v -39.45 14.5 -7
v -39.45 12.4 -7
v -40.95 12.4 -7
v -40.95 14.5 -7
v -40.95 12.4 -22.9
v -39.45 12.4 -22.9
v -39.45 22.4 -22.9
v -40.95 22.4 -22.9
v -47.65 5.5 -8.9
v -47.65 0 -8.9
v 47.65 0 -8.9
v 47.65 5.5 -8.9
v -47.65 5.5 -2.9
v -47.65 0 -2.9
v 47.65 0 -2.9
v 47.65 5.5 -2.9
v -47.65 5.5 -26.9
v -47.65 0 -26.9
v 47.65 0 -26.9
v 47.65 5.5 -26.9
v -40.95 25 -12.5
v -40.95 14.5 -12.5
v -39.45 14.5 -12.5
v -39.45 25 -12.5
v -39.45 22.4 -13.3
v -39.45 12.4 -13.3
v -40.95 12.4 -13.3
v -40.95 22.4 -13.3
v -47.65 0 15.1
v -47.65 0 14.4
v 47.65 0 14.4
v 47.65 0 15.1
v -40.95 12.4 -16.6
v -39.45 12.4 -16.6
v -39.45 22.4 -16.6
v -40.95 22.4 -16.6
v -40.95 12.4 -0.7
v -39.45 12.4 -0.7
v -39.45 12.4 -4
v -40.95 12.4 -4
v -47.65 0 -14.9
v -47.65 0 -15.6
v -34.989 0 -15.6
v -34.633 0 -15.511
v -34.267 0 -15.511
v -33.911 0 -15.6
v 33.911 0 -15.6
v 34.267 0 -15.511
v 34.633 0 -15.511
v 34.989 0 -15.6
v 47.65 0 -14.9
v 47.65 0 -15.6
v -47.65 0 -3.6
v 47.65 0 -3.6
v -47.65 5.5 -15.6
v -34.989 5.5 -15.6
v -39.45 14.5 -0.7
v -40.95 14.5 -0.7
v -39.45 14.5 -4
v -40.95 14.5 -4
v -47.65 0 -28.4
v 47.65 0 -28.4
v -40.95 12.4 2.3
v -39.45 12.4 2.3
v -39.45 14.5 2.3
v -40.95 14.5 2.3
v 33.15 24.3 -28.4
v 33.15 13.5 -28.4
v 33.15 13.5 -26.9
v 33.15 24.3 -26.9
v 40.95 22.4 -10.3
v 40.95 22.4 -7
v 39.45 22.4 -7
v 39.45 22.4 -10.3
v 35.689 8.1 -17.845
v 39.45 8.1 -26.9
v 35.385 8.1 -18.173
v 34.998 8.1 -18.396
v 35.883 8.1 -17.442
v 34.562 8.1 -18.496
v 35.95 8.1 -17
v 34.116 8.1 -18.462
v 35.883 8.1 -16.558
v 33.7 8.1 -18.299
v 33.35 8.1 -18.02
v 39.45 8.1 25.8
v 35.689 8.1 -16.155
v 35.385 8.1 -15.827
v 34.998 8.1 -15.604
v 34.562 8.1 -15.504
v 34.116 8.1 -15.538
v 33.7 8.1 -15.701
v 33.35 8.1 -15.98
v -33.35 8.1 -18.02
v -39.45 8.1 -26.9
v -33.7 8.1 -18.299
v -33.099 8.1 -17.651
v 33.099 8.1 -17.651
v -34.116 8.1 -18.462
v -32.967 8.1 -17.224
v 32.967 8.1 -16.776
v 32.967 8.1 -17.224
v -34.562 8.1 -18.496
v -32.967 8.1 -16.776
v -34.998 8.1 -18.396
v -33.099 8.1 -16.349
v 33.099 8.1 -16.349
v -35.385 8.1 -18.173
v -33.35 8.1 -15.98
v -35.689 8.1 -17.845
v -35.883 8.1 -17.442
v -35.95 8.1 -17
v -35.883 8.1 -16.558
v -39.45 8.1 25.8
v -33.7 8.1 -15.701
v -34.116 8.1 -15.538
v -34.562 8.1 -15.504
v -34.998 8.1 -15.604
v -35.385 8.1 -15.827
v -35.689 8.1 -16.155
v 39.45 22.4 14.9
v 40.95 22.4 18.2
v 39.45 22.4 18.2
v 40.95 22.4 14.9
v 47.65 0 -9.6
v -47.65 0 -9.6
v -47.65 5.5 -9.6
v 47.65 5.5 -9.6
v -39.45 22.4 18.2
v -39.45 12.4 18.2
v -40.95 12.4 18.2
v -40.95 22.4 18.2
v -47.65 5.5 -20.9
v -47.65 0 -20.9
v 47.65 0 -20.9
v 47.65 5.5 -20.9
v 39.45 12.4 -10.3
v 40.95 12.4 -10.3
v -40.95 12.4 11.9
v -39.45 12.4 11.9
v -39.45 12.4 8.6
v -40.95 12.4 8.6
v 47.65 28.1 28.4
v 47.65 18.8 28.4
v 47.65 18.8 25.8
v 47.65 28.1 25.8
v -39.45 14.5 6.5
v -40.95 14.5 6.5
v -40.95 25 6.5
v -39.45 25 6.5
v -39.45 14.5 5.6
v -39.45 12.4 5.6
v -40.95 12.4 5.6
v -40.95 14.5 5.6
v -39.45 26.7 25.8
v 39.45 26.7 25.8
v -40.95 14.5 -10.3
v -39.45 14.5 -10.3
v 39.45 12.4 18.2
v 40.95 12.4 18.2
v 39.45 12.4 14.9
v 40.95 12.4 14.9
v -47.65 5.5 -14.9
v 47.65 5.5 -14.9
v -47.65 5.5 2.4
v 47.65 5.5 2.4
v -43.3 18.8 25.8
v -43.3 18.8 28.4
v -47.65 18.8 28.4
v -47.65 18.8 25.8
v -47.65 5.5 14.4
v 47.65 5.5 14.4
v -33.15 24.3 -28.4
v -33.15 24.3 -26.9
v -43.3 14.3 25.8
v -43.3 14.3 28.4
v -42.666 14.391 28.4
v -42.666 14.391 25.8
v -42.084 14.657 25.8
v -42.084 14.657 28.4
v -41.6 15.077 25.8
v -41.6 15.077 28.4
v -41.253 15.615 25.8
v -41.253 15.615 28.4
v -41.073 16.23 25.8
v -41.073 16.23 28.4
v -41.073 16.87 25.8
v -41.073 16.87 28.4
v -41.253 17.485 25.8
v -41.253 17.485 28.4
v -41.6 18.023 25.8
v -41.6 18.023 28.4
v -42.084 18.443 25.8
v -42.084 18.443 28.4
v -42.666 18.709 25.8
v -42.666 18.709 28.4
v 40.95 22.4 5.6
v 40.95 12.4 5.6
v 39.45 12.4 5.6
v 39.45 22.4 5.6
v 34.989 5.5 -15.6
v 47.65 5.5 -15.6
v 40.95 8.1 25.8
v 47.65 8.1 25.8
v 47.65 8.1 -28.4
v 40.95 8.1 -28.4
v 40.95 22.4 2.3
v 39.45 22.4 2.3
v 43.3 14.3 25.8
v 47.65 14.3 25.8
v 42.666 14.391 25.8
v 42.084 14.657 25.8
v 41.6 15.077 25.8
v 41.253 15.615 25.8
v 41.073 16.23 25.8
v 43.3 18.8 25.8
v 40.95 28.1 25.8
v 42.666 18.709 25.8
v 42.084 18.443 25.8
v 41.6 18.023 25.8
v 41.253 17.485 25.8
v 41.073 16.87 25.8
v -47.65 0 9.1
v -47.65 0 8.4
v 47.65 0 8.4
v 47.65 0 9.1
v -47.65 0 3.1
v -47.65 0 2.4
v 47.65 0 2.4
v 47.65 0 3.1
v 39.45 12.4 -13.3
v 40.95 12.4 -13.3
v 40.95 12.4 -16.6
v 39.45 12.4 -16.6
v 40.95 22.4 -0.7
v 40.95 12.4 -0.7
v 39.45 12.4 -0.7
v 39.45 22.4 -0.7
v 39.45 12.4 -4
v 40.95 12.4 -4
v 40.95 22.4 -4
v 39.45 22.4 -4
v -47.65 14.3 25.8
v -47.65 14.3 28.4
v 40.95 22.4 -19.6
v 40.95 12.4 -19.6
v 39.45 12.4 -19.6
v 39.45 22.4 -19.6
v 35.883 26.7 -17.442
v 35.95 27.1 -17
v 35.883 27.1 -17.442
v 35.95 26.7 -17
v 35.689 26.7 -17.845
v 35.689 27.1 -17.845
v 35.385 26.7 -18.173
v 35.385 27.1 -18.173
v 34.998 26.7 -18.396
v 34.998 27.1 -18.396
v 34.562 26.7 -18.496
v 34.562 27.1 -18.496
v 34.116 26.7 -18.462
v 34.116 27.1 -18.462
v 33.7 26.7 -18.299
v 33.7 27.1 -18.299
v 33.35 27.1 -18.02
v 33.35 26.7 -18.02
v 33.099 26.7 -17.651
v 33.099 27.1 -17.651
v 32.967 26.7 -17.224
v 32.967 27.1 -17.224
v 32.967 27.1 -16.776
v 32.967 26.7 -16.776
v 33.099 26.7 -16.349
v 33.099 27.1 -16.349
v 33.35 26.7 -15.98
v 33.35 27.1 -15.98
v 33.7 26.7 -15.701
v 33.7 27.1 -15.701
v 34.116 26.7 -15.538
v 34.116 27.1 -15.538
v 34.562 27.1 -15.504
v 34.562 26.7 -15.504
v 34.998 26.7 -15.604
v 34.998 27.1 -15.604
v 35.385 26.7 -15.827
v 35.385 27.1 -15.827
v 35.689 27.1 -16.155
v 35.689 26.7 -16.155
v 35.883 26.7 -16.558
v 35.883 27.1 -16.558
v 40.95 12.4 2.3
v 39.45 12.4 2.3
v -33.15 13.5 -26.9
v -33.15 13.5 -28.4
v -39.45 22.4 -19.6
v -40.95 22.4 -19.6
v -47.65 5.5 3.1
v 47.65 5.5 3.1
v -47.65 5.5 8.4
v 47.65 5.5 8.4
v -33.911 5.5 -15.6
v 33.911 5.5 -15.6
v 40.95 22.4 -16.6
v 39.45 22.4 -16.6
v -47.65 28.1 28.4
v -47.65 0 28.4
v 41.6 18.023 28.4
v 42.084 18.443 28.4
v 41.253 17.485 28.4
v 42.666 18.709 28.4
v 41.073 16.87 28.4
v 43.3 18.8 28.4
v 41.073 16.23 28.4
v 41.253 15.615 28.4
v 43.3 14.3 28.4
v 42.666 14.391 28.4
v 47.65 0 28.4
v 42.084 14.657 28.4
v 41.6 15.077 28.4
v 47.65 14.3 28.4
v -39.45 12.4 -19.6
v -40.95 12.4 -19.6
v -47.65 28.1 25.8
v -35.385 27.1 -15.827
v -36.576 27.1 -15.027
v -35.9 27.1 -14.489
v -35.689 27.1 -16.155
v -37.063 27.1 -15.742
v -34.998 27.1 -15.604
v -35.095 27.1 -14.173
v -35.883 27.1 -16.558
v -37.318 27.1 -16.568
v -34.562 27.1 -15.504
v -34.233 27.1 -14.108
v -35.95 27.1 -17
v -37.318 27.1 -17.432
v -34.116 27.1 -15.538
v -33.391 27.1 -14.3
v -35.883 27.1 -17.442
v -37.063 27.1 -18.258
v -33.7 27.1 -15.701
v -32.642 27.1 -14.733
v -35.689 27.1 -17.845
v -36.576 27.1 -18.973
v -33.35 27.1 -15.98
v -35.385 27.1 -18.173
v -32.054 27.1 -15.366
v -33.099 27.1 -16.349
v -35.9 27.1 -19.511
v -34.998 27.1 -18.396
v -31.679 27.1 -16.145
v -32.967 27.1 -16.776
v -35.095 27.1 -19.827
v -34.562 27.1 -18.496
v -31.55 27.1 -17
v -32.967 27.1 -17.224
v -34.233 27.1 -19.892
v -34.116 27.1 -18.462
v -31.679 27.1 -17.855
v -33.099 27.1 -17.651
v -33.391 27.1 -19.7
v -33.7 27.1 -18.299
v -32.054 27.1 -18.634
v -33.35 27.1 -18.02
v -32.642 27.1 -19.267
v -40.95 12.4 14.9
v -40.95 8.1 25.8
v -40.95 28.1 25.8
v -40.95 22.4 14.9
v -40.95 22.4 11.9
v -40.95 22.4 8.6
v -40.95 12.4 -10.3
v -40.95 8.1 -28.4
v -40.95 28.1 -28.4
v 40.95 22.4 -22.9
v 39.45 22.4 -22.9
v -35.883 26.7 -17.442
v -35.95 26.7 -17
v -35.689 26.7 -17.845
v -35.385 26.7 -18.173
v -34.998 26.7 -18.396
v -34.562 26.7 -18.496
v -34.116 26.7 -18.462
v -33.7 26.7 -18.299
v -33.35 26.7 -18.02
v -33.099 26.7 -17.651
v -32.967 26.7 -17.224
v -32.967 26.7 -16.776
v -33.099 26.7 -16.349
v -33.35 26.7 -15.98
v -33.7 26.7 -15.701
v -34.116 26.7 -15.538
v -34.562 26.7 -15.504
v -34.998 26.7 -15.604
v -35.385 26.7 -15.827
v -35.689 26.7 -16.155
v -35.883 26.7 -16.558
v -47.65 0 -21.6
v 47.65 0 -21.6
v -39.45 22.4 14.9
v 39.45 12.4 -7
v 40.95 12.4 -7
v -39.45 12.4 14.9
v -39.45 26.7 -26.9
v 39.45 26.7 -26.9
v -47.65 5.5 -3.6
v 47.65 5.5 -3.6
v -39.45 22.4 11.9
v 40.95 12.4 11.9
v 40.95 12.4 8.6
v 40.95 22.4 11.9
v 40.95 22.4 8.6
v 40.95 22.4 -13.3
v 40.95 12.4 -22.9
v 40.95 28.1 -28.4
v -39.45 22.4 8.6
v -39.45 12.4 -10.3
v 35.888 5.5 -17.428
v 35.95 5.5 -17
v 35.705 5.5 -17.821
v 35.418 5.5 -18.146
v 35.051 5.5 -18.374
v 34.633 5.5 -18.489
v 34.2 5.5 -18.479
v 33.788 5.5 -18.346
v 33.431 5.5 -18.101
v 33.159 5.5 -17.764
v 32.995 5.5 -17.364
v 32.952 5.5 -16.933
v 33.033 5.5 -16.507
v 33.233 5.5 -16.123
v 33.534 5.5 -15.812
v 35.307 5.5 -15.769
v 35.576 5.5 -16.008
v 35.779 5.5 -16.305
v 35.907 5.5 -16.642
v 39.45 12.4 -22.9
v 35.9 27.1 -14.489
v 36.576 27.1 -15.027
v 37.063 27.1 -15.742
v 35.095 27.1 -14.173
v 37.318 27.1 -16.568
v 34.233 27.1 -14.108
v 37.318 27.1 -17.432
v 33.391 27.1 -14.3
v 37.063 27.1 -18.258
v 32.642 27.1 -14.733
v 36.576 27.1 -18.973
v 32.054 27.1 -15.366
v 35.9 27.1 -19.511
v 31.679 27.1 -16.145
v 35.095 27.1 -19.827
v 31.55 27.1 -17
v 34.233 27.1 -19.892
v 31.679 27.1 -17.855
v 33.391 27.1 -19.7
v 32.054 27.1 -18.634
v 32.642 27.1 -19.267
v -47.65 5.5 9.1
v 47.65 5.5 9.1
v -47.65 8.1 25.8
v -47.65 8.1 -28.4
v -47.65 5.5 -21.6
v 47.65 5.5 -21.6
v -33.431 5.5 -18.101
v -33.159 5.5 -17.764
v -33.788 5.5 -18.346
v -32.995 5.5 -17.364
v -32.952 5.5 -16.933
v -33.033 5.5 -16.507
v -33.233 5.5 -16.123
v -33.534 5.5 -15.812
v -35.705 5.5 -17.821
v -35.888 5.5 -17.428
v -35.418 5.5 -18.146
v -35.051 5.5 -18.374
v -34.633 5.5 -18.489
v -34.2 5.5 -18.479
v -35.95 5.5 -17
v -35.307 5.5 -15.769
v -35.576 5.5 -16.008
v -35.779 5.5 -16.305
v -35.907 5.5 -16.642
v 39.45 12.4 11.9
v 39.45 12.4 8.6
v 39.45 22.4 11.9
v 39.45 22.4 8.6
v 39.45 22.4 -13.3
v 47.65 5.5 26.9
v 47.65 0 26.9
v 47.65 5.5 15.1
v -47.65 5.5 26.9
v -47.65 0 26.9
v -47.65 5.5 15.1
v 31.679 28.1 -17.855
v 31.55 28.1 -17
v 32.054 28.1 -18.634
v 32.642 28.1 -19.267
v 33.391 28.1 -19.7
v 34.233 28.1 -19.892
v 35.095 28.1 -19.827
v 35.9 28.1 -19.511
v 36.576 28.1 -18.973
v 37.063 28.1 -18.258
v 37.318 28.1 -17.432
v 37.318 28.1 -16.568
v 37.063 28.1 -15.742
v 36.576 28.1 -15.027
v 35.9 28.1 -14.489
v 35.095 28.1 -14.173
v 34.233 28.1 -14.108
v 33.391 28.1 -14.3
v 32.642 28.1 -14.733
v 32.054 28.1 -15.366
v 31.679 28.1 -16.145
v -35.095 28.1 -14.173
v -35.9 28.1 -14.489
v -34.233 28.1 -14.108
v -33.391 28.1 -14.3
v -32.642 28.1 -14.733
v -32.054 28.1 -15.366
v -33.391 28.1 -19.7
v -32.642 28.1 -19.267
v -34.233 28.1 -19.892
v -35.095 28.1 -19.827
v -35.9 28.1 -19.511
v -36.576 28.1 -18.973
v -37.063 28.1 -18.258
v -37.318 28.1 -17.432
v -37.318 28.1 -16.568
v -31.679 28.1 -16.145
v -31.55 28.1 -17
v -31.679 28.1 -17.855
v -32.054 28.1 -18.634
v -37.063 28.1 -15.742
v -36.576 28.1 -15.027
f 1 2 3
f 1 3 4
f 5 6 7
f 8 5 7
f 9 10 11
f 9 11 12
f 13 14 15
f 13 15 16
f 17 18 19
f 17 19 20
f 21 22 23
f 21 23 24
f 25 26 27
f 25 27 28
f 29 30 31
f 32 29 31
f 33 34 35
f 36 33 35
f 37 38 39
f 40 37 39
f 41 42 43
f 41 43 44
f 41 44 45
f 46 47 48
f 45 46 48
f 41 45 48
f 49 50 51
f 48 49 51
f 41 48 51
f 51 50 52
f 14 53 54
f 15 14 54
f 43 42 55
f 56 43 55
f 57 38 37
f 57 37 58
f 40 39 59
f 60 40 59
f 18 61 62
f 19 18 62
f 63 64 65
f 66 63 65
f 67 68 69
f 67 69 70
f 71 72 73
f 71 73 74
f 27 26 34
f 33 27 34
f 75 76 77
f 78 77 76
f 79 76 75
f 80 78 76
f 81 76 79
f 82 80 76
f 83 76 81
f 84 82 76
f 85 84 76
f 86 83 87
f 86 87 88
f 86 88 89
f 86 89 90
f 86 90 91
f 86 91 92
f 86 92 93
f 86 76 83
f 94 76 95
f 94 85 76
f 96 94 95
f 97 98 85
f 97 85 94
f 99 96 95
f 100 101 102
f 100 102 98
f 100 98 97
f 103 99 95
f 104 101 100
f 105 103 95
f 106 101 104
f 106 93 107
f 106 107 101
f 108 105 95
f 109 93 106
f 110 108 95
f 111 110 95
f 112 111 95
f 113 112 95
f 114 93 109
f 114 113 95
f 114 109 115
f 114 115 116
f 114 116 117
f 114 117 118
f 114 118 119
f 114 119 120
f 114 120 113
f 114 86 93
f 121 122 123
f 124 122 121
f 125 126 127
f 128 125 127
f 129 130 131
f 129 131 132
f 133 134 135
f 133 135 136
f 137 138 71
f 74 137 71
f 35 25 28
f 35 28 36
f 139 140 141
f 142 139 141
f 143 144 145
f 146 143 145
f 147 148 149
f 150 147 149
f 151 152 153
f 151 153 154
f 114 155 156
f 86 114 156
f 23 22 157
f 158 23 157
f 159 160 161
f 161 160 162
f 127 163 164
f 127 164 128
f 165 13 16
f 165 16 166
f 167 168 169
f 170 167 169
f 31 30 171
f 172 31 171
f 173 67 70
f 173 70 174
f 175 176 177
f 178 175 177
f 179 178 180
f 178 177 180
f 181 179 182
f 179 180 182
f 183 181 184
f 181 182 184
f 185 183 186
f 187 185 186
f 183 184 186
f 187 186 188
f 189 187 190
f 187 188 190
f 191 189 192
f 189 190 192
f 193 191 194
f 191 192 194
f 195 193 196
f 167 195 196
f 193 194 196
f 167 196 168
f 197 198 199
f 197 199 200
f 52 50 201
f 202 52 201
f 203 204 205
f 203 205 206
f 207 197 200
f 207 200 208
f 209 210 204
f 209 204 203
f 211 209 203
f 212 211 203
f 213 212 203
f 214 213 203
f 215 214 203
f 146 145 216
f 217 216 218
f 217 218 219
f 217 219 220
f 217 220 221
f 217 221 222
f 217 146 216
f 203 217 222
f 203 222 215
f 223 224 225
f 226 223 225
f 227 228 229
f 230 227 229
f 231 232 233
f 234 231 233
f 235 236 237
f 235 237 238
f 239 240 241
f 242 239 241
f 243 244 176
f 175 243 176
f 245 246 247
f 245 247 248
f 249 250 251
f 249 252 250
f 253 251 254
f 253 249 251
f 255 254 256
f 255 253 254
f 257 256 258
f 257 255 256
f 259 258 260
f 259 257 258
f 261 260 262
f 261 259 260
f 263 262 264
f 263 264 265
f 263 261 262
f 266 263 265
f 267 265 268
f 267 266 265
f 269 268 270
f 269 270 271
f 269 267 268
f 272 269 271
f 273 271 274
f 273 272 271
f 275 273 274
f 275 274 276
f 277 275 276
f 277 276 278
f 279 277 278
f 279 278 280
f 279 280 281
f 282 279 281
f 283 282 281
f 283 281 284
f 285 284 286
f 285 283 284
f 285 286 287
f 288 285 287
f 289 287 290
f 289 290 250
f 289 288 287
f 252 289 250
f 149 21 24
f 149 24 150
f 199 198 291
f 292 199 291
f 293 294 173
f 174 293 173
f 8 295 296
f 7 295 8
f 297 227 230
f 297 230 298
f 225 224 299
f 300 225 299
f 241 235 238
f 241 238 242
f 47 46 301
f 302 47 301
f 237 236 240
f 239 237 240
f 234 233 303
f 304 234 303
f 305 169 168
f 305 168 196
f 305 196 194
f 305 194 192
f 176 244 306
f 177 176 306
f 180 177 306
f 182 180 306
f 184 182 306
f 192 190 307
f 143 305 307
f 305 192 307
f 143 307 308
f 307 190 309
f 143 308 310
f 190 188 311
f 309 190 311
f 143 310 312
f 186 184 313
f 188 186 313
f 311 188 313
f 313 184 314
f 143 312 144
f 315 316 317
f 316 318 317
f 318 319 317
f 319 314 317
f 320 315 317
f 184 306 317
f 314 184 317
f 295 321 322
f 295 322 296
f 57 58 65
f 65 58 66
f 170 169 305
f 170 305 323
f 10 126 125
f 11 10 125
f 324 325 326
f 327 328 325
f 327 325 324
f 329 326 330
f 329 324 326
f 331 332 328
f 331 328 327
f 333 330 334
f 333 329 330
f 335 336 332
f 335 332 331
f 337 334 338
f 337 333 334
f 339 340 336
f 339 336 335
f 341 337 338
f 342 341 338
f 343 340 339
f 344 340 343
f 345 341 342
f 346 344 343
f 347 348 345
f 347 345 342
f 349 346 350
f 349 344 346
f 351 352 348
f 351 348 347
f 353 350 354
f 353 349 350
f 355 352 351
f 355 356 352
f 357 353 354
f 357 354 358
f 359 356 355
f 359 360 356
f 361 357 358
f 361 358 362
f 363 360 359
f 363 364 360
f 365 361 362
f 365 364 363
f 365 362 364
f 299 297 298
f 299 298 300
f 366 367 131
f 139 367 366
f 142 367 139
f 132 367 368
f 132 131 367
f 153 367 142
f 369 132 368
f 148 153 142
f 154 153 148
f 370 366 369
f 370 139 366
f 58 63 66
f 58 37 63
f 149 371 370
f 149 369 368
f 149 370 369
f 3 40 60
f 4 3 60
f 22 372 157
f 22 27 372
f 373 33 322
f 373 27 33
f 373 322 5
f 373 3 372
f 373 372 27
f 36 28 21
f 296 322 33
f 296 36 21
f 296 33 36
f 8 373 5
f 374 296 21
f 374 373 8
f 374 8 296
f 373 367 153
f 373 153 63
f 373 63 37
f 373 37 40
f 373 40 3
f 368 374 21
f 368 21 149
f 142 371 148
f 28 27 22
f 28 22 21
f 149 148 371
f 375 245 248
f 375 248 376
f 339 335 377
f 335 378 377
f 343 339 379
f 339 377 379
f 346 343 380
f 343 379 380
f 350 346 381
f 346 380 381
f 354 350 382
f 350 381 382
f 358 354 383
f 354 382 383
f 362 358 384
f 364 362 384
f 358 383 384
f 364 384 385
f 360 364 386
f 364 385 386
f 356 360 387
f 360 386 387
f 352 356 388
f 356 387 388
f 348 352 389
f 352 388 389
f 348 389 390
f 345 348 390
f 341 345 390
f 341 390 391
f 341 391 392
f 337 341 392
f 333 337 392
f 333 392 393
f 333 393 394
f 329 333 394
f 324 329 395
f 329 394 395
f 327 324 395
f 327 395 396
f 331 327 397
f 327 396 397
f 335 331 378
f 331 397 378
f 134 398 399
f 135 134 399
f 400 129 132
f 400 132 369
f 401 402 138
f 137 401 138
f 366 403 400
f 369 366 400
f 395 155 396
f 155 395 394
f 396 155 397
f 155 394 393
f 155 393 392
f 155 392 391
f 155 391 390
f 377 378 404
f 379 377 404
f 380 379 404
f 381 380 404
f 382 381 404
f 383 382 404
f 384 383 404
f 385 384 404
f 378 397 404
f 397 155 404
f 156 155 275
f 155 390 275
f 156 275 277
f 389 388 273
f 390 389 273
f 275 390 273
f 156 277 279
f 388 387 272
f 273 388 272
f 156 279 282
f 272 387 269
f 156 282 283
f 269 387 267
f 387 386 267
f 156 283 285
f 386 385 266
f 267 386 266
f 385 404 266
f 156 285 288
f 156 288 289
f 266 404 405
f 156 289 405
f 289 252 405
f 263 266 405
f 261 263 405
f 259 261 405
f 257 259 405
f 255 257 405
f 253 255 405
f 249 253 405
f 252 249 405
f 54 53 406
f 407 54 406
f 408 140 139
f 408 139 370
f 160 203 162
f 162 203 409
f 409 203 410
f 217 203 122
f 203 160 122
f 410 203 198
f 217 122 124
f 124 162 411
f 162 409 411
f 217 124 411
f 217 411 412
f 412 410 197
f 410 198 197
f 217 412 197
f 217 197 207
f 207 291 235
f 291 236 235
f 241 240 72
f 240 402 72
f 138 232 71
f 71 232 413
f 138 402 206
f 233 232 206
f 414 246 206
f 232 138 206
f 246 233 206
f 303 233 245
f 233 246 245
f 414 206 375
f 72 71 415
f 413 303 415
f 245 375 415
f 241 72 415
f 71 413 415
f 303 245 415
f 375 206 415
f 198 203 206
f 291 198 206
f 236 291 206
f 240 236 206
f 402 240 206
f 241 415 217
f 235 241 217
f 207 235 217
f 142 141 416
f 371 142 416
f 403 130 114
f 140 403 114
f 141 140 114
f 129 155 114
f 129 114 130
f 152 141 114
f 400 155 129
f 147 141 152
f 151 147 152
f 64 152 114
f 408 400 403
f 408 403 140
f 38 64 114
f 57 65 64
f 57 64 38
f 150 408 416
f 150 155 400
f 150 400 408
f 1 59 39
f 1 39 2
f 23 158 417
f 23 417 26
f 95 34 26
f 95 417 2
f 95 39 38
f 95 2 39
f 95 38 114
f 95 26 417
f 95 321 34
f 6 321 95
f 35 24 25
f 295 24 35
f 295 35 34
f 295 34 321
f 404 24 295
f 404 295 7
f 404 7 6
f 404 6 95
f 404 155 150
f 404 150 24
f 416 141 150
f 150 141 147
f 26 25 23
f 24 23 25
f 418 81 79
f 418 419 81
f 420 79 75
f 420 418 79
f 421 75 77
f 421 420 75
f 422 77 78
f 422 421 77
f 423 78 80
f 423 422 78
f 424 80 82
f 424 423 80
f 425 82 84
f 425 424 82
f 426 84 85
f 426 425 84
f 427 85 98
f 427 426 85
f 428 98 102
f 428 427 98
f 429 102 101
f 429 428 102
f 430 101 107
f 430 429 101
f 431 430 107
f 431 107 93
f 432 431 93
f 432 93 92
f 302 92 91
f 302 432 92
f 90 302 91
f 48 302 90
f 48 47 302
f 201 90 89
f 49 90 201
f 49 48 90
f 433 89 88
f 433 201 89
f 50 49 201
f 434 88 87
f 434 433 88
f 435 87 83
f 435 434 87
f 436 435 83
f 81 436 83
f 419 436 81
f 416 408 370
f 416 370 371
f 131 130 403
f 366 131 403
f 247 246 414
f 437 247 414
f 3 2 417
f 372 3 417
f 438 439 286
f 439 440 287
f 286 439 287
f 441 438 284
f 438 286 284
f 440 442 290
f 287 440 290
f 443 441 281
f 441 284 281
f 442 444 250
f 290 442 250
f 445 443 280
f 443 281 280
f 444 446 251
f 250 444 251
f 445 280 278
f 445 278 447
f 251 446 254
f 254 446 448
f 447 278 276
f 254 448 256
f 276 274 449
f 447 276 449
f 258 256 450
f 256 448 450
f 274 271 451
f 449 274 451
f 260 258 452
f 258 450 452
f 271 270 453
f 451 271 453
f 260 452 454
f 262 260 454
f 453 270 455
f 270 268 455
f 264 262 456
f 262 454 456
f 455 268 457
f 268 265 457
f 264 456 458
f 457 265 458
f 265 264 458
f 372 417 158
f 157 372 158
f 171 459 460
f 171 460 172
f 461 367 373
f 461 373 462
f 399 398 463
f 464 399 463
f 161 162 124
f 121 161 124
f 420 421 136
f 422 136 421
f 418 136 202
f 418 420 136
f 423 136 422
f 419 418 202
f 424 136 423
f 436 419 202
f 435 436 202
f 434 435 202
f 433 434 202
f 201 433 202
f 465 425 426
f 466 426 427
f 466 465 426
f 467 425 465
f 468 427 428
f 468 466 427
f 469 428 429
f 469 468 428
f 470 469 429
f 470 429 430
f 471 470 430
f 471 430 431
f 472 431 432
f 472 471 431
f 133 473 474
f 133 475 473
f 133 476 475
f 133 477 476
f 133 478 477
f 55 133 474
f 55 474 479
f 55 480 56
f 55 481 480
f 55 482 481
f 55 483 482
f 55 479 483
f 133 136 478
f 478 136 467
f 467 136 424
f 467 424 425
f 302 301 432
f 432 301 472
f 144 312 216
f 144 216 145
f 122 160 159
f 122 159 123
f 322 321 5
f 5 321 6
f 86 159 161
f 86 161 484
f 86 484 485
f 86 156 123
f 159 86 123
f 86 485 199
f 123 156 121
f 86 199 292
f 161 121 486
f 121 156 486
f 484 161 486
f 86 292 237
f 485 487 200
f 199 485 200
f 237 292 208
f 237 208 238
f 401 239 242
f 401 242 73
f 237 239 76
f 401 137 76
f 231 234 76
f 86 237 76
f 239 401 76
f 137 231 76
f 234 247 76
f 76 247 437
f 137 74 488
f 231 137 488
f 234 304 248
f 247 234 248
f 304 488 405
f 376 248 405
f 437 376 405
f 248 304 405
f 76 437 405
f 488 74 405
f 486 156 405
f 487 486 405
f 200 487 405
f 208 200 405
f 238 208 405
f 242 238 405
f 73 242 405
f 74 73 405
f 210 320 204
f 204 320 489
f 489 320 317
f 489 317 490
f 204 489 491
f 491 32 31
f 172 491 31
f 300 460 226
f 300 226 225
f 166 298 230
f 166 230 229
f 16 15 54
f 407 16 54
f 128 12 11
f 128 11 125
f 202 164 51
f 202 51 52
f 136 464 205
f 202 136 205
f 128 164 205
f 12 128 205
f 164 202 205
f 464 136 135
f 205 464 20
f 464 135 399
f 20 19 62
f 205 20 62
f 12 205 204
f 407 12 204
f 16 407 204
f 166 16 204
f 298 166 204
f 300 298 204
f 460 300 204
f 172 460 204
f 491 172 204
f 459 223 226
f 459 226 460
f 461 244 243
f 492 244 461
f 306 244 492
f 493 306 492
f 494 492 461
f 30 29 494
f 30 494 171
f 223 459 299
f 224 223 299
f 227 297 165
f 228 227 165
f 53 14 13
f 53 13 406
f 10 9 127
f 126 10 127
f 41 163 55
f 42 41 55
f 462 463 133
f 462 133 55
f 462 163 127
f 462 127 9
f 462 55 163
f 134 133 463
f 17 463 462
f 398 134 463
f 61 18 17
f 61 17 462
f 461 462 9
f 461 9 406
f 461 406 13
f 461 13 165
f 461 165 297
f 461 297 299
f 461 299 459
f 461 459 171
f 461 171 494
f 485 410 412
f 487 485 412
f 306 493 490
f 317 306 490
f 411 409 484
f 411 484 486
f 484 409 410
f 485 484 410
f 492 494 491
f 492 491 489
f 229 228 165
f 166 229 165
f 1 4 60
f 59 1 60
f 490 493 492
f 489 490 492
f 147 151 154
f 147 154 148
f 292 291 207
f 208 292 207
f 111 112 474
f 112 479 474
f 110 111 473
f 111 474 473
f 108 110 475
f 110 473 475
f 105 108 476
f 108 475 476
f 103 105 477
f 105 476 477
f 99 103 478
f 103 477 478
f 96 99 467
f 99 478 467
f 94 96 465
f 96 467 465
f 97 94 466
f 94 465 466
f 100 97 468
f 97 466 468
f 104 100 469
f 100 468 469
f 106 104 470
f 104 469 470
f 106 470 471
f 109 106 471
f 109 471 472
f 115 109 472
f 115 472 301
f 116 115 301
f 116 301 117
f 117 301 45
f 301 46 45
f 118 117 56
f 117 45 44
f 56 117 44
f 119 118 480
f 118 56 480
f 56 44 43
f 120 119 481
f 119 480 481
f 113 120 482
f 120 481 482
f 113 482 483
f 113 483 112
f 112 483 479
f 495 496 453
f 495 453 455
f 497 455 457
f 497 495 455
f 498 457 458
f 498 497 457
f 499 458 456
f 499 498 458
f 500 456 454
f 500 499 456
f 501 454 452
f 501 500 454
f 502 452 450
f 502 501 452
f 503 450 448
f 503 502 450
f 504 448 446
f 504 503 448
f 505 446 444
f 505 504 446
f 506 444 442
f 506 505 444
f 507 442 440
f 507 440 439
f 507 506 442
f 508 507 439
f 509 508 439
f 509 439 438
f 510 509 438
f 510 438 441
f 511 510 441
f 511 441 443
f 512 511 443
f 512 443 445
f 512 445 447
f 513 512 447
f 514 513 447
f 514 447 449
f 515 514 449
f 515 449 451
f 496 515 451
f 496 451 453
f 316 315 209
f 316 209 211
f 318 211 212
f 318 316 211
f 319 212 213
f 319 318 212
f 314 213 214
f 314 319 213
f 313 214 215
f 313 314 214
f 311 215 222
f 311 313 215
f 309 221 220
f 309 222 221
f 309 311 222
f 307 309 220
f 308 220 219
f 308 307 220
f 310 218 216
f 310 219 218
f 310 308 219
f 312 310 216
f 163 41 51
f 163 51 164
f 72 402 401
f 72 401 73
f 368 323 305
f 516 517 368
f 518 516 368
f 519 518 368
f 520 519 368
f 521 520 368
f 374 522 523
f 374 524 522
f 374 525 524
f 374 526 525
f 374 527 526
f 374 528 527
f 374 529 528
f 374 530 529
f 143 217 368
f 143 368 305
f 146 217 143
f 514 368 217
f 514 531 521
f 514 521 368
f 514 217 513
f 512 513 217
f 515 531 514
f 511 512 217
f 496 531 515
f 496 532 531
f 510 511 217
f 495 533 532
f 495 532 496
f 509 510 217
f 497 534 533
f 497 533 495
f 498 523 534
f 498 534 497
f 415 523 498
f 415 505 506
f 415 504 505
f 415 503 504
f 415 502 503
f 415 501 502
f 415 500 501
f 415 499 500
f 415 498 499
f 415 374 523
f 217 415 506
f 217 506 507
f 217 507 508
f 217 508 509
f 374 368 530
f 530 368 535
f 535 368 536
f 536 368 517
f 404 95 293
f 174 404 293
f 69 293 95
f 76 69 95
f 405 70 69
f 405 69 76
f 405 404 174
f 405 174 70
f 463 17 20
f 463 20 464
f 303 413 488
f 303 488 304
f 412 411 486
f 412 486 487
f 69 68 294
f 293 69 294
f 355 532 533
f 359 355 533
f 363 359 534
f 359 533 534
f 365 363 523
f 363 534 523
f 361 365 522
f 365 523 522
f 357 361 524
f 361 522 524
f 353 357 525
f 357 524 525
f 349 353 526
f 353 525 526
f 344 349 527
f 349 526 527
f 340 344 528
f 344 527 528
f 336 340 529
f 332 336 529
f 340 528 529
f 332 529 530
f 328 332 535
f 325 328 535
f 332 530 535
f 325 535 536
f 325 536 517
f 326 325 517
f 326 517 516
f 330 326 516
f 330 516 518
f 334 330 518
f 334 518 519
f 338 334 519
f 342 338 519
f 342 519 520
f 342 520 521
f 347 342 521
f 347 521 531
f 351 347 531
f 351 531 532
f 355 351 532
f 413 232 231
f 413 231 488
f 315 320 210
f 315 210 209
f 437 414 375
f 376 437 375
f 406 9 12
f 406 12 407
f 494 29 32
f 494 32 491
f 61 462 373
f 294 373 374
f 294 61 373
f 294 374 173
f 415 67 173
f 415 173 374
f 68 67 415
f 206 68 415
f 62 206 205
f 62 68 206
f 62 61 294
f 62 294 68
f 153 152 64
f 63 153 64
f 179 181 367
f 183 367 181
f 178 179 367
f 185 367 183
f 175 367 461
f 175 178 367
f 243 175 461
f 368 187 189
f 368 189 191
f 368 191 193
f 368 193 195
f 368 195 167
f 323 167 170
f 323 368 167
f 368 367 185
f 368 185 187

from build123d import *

# Parameters (mm, degrees)
SKETCH1_W                               = 95.3
SKETCH1_H                               = 56.8
BOSS_EXTRUDE1_DEPTH                     = 28.1
SKETCH2_W                               = 5.3
SKETCH2_H                               = 5.5
SKETCH2_W_2                             = 11.8
CUT_EXTRUDE2_DEPTH                      = 104.33566664
SKETCH3_W                               = 6.7
SKETCH3_H                               = 20
CUT_EXTRUDE4_DEPTH                      = 54.2
CUT_EXTRUDE5_DEPTH                      = 80.286647678
SKETCH5_W                               = 3.3
SKETCH5_H                               = 10
CUT_EXTRUDE6_DEPTH                      = 98.191203306
CUT_EXTRUDE8_REACH                      = 65.583
CUT_EXTRUDE8_START                      = -1.4
SKETCH6_W                               = 78.9
SKETCH6_H                               = 52.7
CUT_EXTRUDE9_REACH                      = 99.191
SKETCH7_W                               = 19
SKETCH7_H                               = 10.5
CUT_EXTRUDE10_REACH                     = 81.287
SKETCH8_W                               = 66.3
SKETCH8_H                               = 10.8
CBORE_FOR_M5_HEX_HEAD_BOLT1_D           = 3
CBORE_FOR_M5_HEX_HEAD_BOLT1_CBORE_D     = 5.8
CBORE_FOR_M5_HEX_HEAD_BOLT1_CBORE_DEPTH = 1


with BuildPart() as part:
    # Sketch1 → Boss-Extrude1 (new body)
    with BuildSketch(Plane(origin=(0, 0, 0), x_dir=(1, 0, 0), z_dir=(0, 1, 0))):
        Rectangle(SKETCH1_W, SKETCH1_H)
    extrude(amount=BOSS_EXTRUDE1_DEPTH)

    # Sketch2 → Cut-Extrude2 (cut, through all)
    with BuildSketch(Plane.ZY.offset(47.65)):
        with Locations((-24.25, 2.75)):
            Rectangle(SKETCH2_W, SKETCH2_H)
        with Locations((-18.25, 2.75)):
            Rectangle(SKETCH2_W, SKETCH2_H)
        with Locations((-12.25, 2.75)):
            Rectangle(SKETCH2_W, SKETCH2_H)
        with Locations((-6.25, 2.75)):
            Rectangle(SKETCH2_W, SKETCH2_H)
        with Locations((-0.25, 2.75)):
            Rectangle(SKETCH2_W, SKETCH2_H)
        with Locations((5.75, 2.75)):
            Rectangle(SKETCH2_W, SKETCH2_H)
        with Locations((11.75, 2.75)):
            Rectangle(SKETCH2_W, SKETCH2_H)
        with Locations((21, 2.75)):
            Rectangle(SKETCH2_W_2, SKETCH2_H)
    extrude(amount=-CUT_EXTRUDE2_DEPTH, mode=Mode.SUBTRACT)

    # Sketch3 → Cut-Extrude4 (cut)
    with BuildSketch(Plane(origin=(0, 0, -28.4), x_dir=(-1, 0, 0), z_dir=(0, 0, -1))):
        with Locations((-44.3, 18.1)):
            Rectangle(SKETCH3_W, SKETCH3_H)
        with Locations((44.3, 18.1)):
            Rectangle(SKETCH3_W, SKETCH3_H)
    extrude(amount=-CUT_EXTRUDE4_DEPTH, mode=Mode.SUBTRACT)

    # Sketch4 → Cut-Extrude5 (cut, through all)
    with BuildSketch(Plane.XY.offset(28.4)):
        with BuildLine():
            Line((43.3, 18.8), (52, 18.8))
            ThreePointArc((52, 18.8), (54.25, 16.55), (52, 14.3))
            Line((52, 14.3), (43.3, 14.3))
            ThreePointArc((43.3, 14.3), (41.05, 16.55), (43.3, 18.8))
        make_face()
    cut_extrude5 = extrude(amount=-CUT_EXTRUDE5_DEPTH, mode=Mode.SUBTRACT)

    # Mirror1: Cut-Extrude5 across plane
    add(cut_extrude5.mirror(Plane(origin=(0, 0, 0), x_dir=(0, 0, 1), z_dir=(1, 0, 0))), mode=Mode.SUBTRACT)

    # Sketch5 → Cut-Extrude6 (cut, through all)
    with BuildSketch(Plane(origin=(40.95, 0, 0), x_dir=(0, 0, -1), z_dir=(1, 0, 0))):
        with Locations((-16.55, 17.4)):
            Rectangle(SKETCH5_W, SKETCH5_H)
        with Locations((-10.25, 17.4)):
            Rectangle(SKETCH5_W, SKETCH5_H)
        with Locations((-3.95, 17.4)):
            Rectangle(SKETCH5_W, SKETCH5_H)
        with Locations((2.35, 17.4)):
            Rectangle(SKETCH5_W, SKETCH5_H)
        with Locations((8.65, 17.4)):
            Rectangle(SKETCH5_W, SKETCH5_H)
        with Locations((14.95, 17.4)):
            Rectangle(SKETCH5_W, SKETCH5_H)
        with Locations((21.25, 17.4)):
            Rectangle(SKETCH5_W, SKETCH5_H)
    extrude(amount=-CUT_EXTRUDE6_DEPTH, mode=Mode.SUBTRACT)

    # Cut-Extrude8: up to this face of the body (flat: up to its plane)
    cut_extrude8_end = Plane(part.part.faces().sort_by_distance((-44.3, 8.1, -1.3))[0])
    # Sketch6 → Cut-Extrude8 (cut, up to the picked face)
    with BuildSketch(Plane(origin=(0, 28.1, 0), x_dir=(1, 0, 0), z_dir=(0, 1, 0)).offset(CUT_EXTRUDE8_START), mode=Mode.PRIVATE) as cut_extrude8_sk1:
        with Locations((0, 0.55)):
            Rectangle(SKETCH6_W, SKETCH6_H)
    cut_extrude8_tool1 = split(extrude(cut_extrude8_sk1.sketch, amount=-CUT_EXTRUDE8_REACH, mode=Mode.PRIVATE), bisect_by=cut_extrude8_end, keep=Keep.BOTH, mode=Mode.PRIVATE)
    add(cut_extrude8_tool1.solids().sort_by(Axis((0, 26.7, -0.55), (0, -1, 0)))[0], mode=Mode.SUBTRACT)

    # Sketch7 → Cut-Extrude9 (cut, up to next)
    with BuildSketch(Plane.ZY.offset(40.95), mode=Mode.PRIVATE) as cut_extrude9_sk1:
        with Locations((-3, 19.75)):
            Rectangle(SKETCH7_W, SKETCH7_H)
    cut_extrude9_tool1 = extrude(cut_extrude9_sk1.sketch, amount=-CUT_EXTRUDE9_REACH, mode=Mode.PRIVATE) & part.part
    add(cut_extrude9_tool1.solids().sort_by_distance((-40.95, 19.75, -3))[0], mode=Mode.SUBTRACT)

    # Sketch8 → Cut-Extrude10 (cut, up to next)
    with BuildSketch(Plane(origin=(0, 0, -28.4), x_dir=(-1, 0, 0), z_dir=(0, 0, -1)), mode=Mode.PRIVATE) as cut_extrude10_sk1:
        with Locations((0, 18.9)):
            Rectangle(SKETCH8_W, SKETCH8_H)
    cut_extrude10_tool1 = extrude(cut_extrude10_sk1.sketch, amount=-CUT_EXTRUDE10_REACH, mode=Mode.PRIVATE) & part.part
    add(cut_extrude10_tool1.solids().sort_by_distance((0, 18.9, -28.4))[0], mode=Mode.SUBTRACT)

    # CBORE for M5 Hex Head Bolt1 (through all)
    with Locations(Plane(origin=(0, 28.1, 0), x_dir=(1, 0, 0), z_dir=(0, 1, 0))):
        with Locations((-34.45, 17)):
            cbore_for_m5_hex_head_bolt1 = CounterBoreHole(CBORE_FOR_M5_HEX_HEAD_BOLT1_D / 2, CBORE_FOR_M5_HEX_HEAD_BOLT1_CBORE_D / 2, CBORE_FOR_M5_HEX_HEAD_BOLT1_CBORE_DEPTH)

    # Mirror2: CBORE for M5 Hex Head Bolt1 across plane
    add(cbore_for_m5_hex_head_bolt1.mirror(Plane(origin=(0, 0, 0), x_dir=(0, 0, 1), z_dir=(1, 0, 0))), mode=Mode.SUBTRACT)


solid = part.part
